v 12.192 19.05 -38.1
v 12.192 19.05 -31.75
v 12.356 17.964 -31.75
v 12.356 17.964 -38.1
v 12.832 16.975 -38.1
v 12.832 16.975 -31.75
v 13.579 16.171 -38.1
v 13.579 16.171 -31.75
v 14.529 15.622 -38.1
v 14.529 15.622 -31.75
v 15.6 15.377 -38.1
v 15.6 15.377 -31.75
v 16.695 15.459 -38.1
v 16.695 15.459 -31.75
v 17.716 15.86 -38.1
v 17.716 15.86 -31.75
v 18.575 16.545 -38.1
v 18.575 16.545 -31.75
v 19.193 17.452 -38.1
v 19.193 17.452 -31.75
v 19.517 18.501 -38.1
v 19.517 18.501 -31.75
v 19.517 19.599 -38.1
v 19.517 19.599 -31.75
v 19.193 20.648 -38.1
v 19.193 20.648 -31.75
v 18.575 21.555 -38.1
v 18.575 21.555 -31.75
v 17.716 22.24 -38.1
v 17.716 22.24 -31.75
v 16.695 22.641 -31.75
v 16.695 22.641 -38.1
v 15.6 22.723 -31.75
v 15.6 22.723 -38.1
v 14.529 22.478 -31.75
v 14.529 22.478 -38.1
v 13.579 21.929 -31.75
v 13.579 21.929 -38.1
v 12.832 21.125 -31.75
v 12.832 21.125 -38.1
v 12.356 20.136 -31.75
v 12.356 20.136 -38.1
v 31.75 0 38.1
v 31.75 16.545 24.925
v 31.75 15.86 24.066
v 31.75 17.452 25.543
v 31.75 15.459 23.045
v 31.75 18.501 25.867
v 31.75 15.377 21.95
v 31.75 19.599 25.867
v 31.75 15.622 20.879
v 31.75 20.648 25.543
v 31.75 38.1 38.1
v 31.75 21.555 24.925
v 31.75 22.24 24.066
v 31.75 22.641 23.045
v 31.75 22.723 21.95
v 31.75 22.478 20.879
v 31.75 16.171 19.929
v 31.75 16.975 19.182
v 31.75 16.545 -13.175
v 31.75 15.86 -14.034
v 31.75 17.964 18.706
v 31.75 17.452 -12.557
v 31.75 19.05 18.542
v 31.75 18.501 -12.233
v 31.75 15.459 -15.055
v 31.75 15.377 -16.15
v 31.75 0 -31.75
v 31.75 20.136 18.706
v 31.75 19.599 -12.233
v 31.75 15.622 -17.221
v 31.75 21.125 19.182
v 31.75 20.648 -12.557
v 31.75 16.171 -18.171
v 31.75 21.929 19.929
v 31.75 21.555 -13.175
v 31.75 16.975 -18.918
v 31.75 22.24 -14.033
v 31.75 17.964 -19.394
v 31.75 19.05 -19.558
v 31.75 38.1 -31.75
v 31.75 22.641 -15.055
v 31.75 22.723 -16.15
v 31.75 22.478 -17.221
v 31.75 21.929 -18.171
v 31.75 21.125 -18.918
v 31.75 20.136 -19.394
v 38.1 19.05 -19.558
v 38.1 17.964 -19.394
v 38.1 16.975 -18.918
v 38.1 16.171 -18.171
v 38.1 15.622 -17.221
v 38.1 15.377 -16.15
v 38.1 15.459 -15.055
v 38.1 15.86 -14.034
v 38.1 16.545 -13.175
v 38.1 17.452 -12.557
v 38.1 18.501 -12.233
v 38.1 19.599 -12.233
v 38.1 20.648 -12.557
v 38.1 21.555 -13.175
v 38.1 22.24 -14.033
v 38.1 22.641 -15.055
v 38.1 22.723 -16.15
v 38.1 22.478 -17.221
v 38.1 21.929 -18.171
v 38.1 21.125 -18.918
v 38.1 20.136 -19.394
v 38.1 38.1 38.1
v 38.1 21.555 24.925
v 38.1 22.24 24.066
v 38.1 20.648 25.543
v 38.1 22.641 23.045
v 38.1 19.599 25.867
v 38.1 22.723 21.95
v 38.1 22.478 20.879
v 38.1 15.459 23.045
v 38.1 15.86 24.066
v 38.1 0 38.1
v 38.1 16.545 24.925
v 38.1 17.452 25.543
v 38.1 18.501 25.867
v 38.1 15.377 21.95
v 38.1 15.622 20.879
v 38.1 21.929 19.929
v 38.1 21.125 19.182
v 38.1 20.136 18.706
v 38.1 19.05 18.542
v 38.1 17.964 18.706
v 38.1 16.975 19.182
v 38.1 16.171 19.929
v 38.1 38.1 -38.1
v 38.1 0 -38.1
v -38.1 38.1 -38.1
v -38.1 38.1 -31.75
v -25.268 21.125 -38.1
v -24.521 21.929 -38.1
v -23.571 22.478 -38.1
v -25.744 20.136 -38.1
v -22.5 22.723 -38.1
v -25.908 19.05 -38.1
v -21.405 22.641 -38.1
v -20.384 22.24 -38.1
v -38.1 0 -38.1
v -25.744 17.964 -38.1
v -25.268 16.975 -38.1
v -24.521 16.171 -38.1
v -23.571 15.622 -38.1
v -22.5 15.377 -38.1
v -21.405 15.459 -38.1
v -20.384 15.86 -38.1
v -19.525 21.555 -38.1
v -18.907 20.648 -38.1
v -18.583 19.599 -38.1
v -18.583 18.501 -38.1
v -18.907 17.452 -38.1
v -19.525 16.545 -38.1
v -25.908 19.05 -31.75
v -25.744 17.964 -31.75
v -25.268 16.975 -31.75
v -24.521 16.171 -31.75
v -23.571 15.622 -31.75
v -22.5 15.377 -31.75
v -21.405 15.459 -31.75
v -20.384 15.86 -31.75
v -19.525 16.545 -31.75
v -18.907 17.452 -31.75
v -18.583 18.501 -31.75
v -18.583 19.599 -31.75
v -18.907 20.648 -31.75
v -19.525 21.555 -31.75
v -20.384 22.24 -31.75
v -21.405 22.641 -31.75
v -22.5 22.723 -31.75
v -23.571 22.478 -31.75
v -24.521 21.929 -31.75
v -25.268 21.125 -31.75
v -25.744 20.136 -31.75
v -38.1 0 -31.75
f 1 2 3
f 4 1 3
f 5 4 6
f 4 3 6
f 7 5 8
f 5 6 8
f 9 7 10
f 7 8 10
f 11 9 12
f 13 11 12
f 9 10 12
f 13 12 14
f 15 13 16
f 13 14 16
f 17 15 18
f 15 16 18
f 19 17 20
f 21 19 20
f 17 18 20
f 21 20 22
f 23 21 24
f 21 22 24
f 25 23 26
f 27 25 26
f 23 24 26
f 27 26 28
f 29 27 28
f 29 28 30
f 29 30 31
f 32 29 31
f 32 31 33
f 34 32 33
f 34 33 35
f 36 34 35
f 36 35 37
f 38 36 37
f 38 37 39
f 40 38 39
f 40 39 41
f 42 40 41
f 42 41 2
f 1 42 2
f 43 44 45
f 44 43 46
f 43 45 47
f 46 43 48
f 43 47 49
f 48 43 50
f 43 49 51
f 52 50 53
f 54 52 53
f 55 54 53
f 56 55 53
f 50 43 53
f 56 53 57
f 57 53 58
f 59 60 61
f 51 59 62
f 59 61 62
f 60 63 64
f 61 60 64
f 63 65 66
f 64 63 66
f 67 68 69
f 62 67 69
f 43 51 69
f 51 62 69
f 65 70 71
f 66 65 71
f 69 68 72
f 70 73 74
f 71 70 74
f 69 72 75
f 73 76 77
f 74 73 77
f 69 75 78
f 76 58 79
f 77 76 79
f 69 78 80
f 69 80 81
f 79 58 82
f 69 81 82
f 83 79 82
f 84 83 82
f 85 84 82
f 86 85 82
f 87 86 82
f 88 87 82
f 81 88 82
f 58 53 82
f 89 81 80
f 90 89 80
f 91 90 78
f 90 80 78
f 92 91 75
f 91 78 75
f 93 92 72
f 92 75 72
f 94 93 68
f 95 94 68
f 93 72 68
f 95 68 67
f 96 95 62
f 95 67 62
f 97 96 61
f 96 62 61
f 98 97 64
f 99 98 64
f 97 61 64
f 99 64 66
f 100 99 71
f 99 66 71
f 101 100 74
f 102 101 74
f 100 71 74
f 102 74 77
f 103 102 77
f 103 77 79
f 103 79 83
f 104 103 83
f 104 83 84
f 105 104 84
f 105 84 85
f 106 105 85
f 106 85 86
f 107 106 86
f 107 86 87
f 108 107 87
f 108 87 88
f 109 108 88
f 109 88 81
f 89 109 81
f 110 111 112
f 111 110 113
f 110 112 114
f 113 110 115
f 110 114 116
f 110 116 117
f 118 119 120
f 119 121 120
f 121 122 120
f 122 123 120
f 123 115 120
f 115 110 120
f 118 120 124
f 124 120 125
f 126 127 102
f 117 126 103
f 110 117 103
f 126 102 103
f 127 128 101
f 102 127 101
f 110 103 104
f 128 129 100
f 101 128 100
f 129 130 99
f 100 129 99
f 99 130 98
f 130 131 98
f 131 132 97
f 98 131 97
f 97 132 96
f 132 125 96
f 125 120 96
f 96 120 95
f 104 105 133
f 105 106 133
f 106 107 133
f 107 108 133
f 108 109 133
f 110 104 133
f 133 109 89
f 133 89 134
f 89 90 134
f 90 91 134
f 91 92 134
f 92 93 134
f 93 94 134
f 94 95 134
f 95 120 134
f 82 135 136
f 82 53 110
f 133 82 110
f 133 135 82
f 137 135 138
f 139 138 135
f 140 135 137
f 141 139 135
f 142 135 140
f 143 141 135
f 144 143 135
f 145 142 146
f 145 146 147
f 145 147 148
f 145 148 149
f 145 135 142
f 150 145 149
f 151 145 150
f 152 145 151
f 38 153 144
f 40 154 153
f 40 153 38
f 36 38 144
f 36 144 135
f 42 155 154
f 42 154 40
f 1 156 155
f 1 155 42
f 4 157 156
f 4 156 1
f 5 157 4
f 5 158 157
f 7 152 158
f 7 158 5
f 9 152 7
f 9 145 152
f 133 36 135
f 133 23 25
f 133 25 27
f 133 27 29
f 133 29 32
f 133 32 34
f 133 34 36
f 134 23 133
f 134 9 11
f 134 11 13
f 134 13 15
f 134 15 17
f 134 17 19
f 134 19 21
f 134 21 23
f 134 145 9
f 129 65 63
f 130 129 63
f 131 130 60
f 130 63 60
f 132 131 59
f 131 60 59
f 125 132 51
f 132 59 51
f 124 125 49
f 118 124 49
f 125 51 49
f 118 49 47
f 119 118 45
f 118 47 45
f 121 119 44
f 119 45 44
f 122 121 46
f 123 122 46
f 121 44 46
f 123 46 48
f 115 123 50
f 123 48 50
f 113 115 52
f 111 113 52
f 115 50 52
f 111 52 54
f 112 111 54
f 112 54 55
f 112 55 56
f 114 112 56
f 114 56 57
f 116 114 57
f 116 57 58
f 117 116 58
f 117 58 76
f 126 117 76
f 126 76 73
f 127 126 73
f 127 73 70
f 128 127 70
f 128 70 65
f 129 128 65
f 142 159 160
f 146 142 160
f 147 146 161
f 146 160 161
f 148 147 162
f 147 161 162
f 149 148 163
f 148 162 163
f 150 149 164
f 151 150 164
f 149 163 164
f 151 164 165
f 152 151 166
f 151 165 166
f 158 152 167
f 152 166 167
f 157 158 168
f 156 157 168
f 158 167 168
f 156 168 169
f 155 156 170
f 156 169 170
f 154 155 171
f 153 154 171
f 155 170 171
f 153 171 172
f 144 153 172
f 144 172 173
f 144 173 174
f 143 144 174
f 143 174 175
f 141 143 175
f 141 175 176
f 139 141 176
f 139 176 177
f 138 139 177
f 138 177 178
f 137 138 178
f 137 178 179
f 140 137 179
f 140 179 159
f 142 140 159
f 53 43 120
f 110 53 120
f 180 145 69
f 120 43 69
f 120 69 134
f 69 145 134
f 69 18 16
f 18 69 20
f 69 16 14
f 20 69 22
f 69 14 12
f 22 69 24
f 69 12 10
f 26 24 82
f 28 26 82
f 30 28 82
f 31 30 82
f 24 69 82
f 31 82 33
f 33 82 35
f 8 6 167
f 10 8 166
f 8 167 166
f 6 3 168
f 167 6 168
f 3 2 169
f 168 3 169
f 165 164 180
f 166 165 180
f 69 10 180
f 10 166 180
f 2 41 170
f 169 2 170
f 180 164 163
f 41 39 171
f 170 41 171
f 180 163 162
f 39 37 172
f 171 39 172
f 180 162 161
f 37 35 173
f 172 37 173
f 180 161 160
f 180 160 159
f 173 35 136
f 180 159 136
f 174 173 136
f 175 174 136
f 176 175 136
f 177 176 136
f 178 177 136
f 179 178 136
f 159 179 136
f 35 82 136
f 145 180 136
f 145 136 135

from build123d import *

# Parameters (mm, degrees)
SKETCH1_W           = 76.2
SKETCH1_H           = 76.2
BOSS_EXTRUDE1_DEPTH = 38.1
SKETCH2_OUTSIDE_W   = 101.06
SKETCH2_OUTSIDE_H   = 101.06
CUT_EXTRUDE1_DEPTH  = 66.991135768
CUT_EXTRUDE2_DEPTH  = 38.1
CUT_EXTRUDE3_DEPTH  = 38.1


with BuildPart() as part:
    # Sketch1 → Boss-Extrude1 (new body)
    with BuildSketch(Plane(origin=(0, 0, 0), x_dir=(1, 0, 0), z_dir=(0, 1, 0))):
        Rectangle(SKETCH1_W, SKETCH1_H)
    extrude(amount=BOSS_EXTRUDE1_DEPTH)

    # Sketch2 outside → Cut-Extrude1 (cut, through all)
    with BuildSketch(Plane(origin=(0, 38.1, 0), x_dir=(1, 0, 0), z_dir=(0, 1, 0))):
        Rectangle(SKETCH2_OUTSIDE_W, SKETCH2_OUTSIDE_H)
        Polygon((-38.1, 38.1), (38.1, 38.1), (38.1, 31.75), (38.1, -38.1), (31.75, -38.1), (31.75, 31.75), (-38.1, 31.75), align=None, mode=Mode.SUBTRACT)
    extrude(amount=-CUT_EXTRUDE1_DEPTH, mode=Mode.SUBTRACT)

    # Sketch4 → Cut-Extrude2 (cut)
    with BuildSketch(Plane.XY.offset(-31.75)):
        with BuildLine():
            Line((-25.908, 19.05), (-22.225, 19.05))
            Line((-22.225, 19.05), (-18.542, 19.05))
            ThreePointArc((-18.542, 19.05), (-22.225, 22.733), (-25.908, 19.05))
        make_face()
        with BuildLine():
            Line((-18.542, 19.05), (-22.225, 19.05))
            Line((-22.225, 19.05), (-25.908, 19.05))
            ThreePointArc((-25.908, 19.05), (-22.225, 15.367), (-18.542, 19.05))
        make_face()
        with BuildLine():
            ThreePointArc((19.558, 19.05), (15.875, 22.733), (12.192, 19.05))
            Line((12.192, 19.05), (15.875, 19.05))
            Line((15.875, 19.05), (19.558, 19.05))
        make_face()
        with BuildLine():
            Line((15.875, 19.05), (12.192, 19.05))
            ThreePointArc((12.192, 19.05), (15.875, 15.367), (19.558, 19.05))
            Line((19.558, 19.05), (15.875, 19.05))
        make_face()
    extrude(amount=-CUT_EXTRUDE2_DEPTH, mode=Mode.SUBTRACT)

    # Sketch5 → Cut-Extrude3 (cut)
    with BuildSketch(Plane.ZY.offset(-31.75)):
        with BuildLine():
            Line((-19.558, 19.05), (-15.875, 19.05))
            Line((-15.875, 19.05), (-12.192, 19.05))
            ThreePointArc((-12.192, 19.05), (-15.875, 22.733), (-19.558, 19.05))
        make_face()
        with BuildLine():
            Line((-12.192, 19.05), (-15.875, 19.05))
            Line((-15.875, 19.05), (-19.558, 19.05))
            ThreePointArc((-19.558, 19.05), (-15.875, 15.367), (-12.192, 19.05))
        make_face()
        with BuildLine():
            ThreePointArc((25.908, 19.05), (22.225, 22.733), (18.542, 19.05))
            Line((18.542, 19.05), (22.225, 19.05))
            Line((22.225, 19.05), (25.908, 19.05))
        make_face()
        with BuildLine():
            Line((22.225, 19.05), (18.542, 19.05))
            ThreePointArc((18.542, 19.05), (22.225, 15.367), (25.908, 19.05))
            Line((25.908, 19.05), (22.225, 19.05))
        make_face()
    extrude(amount=-CUT_EXTRUDE3_DEPTH, mode=Mode.SUBTRACT)


solid = part.part
